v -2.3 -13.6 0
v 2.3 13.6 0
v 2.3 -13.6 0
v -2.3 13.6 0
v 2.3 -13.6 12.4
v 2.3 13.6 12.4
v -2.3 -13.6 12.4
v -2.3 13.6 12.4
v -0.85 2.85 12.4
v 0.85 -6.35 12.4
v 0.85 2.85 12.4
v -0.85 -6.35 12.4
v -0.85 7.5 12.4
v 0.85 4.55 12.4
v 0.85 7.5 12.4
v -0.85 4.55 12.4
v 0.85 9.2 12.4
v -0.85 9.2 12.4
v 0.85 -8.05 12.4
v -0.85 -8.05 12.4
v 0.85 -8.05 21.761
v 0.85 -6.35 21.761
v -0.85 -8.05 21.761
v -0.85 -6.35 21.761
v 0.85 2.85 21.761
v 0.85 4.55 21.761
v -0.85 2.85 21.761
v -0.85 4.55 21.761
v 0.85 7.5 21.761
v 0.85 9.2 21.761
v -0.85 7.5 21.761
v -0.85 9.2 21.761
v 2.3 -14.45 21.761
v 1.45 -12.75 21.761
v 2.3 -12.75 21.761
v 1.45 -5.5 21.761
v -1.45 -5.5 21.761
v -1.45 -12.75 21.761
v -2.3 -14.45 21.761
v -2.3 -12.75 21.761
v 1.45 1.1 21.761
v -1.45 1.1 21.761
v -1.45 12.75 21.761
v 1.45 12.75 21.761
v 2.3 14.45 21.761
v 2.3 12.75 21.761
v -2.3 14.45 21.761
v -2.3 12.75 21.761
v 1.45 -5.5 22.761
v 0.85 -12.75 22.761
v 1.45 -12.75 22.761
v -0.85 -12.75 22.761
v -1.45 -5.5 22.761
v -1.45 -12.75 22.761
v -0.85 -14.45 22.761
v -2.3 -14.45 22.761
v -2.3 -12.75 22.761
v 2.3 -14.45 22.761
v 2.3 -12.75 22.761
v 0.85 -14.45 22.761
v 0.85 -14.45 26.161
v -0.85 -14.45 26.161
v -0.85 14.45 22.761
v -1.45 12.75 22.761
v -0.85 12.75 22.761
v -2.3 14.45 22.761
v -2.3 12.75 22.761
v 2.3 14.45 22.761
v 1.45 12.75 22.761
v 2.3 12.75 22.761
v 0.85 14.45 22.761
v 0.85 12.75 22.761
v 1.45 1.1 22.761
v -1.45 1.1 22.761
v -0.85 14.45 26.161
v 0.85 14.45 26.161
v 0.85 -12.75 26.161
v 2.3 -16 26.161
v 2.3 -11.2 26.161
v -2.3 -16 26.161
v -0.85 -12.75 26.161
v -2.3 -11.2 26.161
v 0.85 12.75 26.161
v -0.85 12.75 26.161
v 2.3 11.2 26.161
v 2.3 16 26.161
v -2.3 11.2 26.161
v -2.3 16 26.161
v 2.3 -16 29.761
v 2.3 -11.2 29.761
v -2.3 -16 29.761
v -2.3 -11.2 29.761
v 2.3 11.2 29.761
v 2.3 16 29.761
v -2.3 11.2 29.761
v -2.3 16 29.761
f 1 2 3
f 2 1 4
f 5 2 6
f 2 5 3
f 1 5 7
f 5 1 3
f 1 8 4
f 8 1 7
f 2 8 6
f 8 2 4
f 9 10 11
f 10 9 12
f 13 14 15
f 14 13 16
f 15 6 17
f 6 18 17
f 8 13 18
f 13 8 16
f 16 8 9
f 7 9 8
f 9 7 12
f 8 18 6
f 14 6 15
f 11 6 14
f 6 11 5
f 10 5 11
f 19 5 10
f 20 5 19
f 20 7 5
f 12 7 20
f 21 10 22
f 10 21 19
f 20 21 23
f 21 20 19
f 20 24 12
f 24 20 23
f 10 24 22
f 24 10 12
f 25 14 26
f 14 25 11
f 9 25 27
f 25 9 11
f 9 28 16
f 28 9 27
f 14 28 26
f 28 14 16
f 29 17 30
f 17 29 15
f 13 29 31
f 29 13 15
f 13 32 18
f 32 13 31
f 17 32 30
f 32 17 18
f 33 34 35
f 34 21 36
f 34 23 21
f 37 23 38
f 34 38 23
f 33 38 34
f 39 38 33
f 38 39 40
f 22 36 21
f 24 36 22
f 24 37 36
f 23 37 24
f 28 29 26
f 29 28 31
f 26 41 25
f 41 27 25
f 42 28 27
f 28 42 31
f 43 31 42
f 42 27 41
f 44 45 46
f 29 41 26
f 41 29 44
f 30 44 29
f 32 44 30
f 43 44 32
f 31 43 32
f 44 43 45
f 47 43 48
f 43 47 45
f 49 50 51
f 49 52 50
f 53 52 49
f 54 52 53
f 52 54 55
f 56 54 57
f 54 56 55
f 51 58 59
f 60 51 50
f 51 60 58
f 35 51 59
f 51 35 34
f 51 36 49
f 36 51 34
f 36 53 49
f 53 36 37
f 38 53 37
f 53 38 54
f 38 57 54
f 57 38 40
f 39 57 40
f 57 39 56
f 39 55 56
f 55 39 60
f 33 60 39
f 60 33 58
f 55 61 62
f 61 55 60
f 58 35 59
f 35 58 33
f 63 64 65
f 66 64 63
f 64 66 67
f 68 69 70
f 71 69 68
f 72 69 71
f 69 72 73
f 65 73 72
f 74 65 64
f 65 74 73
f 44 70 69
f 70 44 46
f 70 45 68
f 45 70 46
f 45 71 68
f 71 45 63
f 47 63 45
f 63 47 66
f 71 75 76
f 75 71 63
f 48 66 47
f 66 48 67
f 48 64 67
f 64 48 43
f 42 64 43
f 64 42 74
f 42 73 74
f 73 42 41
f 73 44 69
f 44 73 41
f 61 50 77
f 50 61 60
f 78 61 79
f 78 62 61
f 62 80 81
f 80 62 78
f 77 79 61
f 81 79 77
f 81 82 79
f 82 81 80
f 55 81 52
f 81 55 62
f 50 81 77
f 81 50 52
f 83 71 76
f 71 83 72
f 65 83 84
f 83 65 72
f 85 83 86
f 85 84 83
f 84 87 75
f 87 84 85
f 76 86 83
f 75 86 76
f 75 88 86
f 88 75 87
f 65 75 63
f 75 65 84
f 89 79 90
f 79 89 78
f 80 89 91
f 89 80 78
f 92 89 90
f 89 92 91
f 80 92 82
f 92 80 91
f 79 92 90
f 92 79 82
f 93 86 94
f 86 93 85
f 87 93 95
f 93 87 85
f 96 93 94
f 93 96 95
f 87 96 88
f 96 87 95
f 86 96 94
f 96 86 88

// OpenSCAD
// Generated by SolidPython 0.4.2 on 2020-09-29 23:22:31
//!OpenSCAD

scale(v = 0.0100000000) {
	translate(v = [-230, -1360, 0]) {
		union() {
			color(c = [0.4000000000, 0.4000000000, 0.4000000000]) {
				translate(v = [0, 0, 0]) {
					linear_extrude(height = 1000.0000000000) {
						polygon(paths = [[0, 1, 2, 3]], points = [[0, 0], [0, 2720], [460, 2720], [460, 0]]);
					}
				}
			}
			color(c = [0.2000000000, 0.6000000000, 0.2000000000]) {
				translate(v = [0, 0, 1000.0000000000]) {
					linear_extrude(height = 120.0000000000) {
						polygon(paths = [[0, 1, 2, 3]], points = [[0, 1305], [0, 2720], [460, 2720], [460, 1305]]);
					}
				}
			}
			color(c = [0.4000000000, 0.4000000000, 0.4000000000]) {
				translate(v = [0, 0, 1000.0000000000]) {
					linear_extrude(height = 120.0000000000) {
						polygon(paths = [[0, 1, 2, 3]], points = [[0, 0], [0, 1305], [460, 1305], [460, 0]]);
					}
				}
			}
			color(c = [0.2000000000, 0.6000000000, 0.2000000000]) {
				translate(v = [0, 0, 1120.0000000000]) {
					linear_extrude(height = 120.0000000000) {
						polygon(paths = [[0, 1, 2, 3]], points = [[0, 1305], [0, 2720], [460, 2720], [460, 1305]]);
					}
				}
			}
			color(c = [0.4000000000, 0.4000000000, 0.4000000000]) {
				translate(v = [0, 0, 1120.0000000000]) {
					linear_extrude(height = 120.0000000000) {
						polygon(paths = [[0, 1, 2, 3]], points = [[0, 0], [0, 1305], [460, 1305], [460, 0]]);
					}
				}
			}
			color(c = [0.1000000000, 0.1000000000, 0.1000000000]) {
				translate(v = [0, 0, 1240.0000000000]) {
					linear_extrude(height = 70.0000000000) {
						polygon(paths = [[0, 1, 2, 3]], points = [[145, 555], [145, 725], [315, 725], [315, 555]]);
					}
				}
			}
			color(c = [0.1000000000, 0.1000000000, 0.1000000000]) {
				translate(v = [0, 0, 1240.0000000000]) {
					linear_extrude(height = 70.0000000000) {
						polygon(paths = [[0, 1, 2, 3]], points = [[145, 1645], [145, 1815], [315, 1815], [315, 1645]]);
					}
				}
			}
			color(c = [0.1000000000, 0.1000000000, 0.1000000000]) {
				translate(v = [0, 0, 1240.0000000000]) {
					linear_extrude(height = 70.0000000000) {
						polygon(paths = [[0, 1, 2, 3]], points = [[145, 2110], [145, 2280], [315, 2280], [315, 2110]]);
					}
				}
			}
			color(c = [0.1000000000, 0.1000000000, 0.1000000000]) {
				translate(v = [0, 0, 1310.0000000000]) {
					linear_extrude(height = 180.0000000000) {
						polygon(paths = [[0, 1, 2, 3]], points = [[145, 555], [145, 725], [315, 725], [315, 555]]);
					}
				}
			}
			color(c = [0.1000000000, 0.1000000000, 0.1000000000]) {
				translate(v = [0, 0, 1310.0000000000]) {
					linear_extrude(height = 180.0000000000) {
						polygon(paths = [[0, 1, 2, 3]], points = [[145, 1645], [145, 1815], [315, 1815], [315, 1645]]);
					}
				}
			}
			color(c = [0.1000000000, 0.1000000000, 0.1000000000]) {
				translate(v = [0, 0, 1310.0000000000]) {
					linear_extrude(height = 180.0000000000) {
						polygon(paths = [[0, 1, 2, 3]], points = [[145, 2110], [145, 2280], [315, 2280], [315, 2110]]);
					}
				}
			}
			color(c = [0.1000000000, 0.1000000000, 0.1000000000]) {
				translate(v = [0, 0, 1490.0000000000]) {
					linear_extrude(height = 686.1000000000) {
						polygon(paths = [[0, 1, 2, 3]], points = [[145, 555], [145, 725], [315, 725], [315, 555]]);
					}
				}
			}
			color(c = [0.1000000000, 0.1000000000, 0.1000000000]) {
				translate(v = [0, 0, 1490.0000000000]) {
					linear_extrude(height = 686.1000000000) {
						polygon(paths = [[0, 1, 2, 3]], points = [[145, 1645], [145, 1815], [315, 1815], [315, 1645]]);
					}
				}
			}
			color(c = [0.1000000000, 0.1000000000, 0.1000000000]) {
				translate(v = [0, 0, 1490.0000000000]) {
					linear_extrude(height = 686.1000000000) {
						polygon(paths = [[0, 1, 2, 3]], points = [[145, 2110], [145, 2280], [315, 2280], [315, 2110]]);
					}
				}
			}
			color(c = [0.9000000000, 0.6000000000, 0.6000000000]) {
				translate(v = [0, 0, 2176.1000000000]) {
					linear_extrude(height = 100.0000000000) {
						polygon(paths = [[0, 1, 2, 3, 4, 5, 6, 7]], points = [[0, -85], [0, 85], [85, 85], [85, 810], [375, 810], [375, 85], [460, 85], [460, -85]]);
					}
				}
			}
			color(c = [0.9000000000, 0.6000000000, 0.6000000000]) {
				translate(v = [0, 0, 2176.1000000000]) {
					linear_extrude(height = 100.0000000000) {
						polygon(paths = [[0, 1, 2, 3, 4, 5, 6, 7]], points = [[85, 1470], [85, 2635], [0, 2635], [0, 2805], [460, 2805], [460, 2635], [375, 2635], [375, 1470]]);
					}
				}
			}
			color(c = [0.5000000000, 0.5000000000, 0.5000000000]) {
				translate(v = [0, 0, 2276.1000000000]) {
					linear_extrude(height = 340.0000000000) {
						polygon(paths = [[0, 1, 2, 3]], points = [[145, -85], [145, 85], [315, 85], [315, -85]]);
					}
				}
			}
			color(c = [0.5000000000, 0.5000000000, 0.5000000000]) {
				translate(v = [0, 0, 2276.1000000000]) {
					linear_extrude(height = 340.0000000000) {
						polygon(paths = [[0, 1, 2, 3]], points = [[145, 2635], [145, 2805], [315, 2805], [315, 2635]]);
					}
				}
			}
			color(c = [0.3000000000, 0.3000000000, 1]) {
				translate(v = [0, 0, 2616.1000000000]) {
					linear_extrude(height = 360.0000000000) {
						polygon(paths = [[0, 1, 2, 3]], points = [[0, -240], [0, 240], [460, 240], [460, -240]]);
					}
				}
			}
			color(c = [0.3000000000, 0.3000000000, 1]) {
				translate(v = [0, 0, 2616.1000000000]) {
					linear_extrude(height = 360.0000000000) {
						polygon(paths = [[0, 1, 2, 3]], points = [[0, 2480], [0, 2960], [460, 2960], [460, 2480]]);
					}
				}
			}
		}
	}
}
